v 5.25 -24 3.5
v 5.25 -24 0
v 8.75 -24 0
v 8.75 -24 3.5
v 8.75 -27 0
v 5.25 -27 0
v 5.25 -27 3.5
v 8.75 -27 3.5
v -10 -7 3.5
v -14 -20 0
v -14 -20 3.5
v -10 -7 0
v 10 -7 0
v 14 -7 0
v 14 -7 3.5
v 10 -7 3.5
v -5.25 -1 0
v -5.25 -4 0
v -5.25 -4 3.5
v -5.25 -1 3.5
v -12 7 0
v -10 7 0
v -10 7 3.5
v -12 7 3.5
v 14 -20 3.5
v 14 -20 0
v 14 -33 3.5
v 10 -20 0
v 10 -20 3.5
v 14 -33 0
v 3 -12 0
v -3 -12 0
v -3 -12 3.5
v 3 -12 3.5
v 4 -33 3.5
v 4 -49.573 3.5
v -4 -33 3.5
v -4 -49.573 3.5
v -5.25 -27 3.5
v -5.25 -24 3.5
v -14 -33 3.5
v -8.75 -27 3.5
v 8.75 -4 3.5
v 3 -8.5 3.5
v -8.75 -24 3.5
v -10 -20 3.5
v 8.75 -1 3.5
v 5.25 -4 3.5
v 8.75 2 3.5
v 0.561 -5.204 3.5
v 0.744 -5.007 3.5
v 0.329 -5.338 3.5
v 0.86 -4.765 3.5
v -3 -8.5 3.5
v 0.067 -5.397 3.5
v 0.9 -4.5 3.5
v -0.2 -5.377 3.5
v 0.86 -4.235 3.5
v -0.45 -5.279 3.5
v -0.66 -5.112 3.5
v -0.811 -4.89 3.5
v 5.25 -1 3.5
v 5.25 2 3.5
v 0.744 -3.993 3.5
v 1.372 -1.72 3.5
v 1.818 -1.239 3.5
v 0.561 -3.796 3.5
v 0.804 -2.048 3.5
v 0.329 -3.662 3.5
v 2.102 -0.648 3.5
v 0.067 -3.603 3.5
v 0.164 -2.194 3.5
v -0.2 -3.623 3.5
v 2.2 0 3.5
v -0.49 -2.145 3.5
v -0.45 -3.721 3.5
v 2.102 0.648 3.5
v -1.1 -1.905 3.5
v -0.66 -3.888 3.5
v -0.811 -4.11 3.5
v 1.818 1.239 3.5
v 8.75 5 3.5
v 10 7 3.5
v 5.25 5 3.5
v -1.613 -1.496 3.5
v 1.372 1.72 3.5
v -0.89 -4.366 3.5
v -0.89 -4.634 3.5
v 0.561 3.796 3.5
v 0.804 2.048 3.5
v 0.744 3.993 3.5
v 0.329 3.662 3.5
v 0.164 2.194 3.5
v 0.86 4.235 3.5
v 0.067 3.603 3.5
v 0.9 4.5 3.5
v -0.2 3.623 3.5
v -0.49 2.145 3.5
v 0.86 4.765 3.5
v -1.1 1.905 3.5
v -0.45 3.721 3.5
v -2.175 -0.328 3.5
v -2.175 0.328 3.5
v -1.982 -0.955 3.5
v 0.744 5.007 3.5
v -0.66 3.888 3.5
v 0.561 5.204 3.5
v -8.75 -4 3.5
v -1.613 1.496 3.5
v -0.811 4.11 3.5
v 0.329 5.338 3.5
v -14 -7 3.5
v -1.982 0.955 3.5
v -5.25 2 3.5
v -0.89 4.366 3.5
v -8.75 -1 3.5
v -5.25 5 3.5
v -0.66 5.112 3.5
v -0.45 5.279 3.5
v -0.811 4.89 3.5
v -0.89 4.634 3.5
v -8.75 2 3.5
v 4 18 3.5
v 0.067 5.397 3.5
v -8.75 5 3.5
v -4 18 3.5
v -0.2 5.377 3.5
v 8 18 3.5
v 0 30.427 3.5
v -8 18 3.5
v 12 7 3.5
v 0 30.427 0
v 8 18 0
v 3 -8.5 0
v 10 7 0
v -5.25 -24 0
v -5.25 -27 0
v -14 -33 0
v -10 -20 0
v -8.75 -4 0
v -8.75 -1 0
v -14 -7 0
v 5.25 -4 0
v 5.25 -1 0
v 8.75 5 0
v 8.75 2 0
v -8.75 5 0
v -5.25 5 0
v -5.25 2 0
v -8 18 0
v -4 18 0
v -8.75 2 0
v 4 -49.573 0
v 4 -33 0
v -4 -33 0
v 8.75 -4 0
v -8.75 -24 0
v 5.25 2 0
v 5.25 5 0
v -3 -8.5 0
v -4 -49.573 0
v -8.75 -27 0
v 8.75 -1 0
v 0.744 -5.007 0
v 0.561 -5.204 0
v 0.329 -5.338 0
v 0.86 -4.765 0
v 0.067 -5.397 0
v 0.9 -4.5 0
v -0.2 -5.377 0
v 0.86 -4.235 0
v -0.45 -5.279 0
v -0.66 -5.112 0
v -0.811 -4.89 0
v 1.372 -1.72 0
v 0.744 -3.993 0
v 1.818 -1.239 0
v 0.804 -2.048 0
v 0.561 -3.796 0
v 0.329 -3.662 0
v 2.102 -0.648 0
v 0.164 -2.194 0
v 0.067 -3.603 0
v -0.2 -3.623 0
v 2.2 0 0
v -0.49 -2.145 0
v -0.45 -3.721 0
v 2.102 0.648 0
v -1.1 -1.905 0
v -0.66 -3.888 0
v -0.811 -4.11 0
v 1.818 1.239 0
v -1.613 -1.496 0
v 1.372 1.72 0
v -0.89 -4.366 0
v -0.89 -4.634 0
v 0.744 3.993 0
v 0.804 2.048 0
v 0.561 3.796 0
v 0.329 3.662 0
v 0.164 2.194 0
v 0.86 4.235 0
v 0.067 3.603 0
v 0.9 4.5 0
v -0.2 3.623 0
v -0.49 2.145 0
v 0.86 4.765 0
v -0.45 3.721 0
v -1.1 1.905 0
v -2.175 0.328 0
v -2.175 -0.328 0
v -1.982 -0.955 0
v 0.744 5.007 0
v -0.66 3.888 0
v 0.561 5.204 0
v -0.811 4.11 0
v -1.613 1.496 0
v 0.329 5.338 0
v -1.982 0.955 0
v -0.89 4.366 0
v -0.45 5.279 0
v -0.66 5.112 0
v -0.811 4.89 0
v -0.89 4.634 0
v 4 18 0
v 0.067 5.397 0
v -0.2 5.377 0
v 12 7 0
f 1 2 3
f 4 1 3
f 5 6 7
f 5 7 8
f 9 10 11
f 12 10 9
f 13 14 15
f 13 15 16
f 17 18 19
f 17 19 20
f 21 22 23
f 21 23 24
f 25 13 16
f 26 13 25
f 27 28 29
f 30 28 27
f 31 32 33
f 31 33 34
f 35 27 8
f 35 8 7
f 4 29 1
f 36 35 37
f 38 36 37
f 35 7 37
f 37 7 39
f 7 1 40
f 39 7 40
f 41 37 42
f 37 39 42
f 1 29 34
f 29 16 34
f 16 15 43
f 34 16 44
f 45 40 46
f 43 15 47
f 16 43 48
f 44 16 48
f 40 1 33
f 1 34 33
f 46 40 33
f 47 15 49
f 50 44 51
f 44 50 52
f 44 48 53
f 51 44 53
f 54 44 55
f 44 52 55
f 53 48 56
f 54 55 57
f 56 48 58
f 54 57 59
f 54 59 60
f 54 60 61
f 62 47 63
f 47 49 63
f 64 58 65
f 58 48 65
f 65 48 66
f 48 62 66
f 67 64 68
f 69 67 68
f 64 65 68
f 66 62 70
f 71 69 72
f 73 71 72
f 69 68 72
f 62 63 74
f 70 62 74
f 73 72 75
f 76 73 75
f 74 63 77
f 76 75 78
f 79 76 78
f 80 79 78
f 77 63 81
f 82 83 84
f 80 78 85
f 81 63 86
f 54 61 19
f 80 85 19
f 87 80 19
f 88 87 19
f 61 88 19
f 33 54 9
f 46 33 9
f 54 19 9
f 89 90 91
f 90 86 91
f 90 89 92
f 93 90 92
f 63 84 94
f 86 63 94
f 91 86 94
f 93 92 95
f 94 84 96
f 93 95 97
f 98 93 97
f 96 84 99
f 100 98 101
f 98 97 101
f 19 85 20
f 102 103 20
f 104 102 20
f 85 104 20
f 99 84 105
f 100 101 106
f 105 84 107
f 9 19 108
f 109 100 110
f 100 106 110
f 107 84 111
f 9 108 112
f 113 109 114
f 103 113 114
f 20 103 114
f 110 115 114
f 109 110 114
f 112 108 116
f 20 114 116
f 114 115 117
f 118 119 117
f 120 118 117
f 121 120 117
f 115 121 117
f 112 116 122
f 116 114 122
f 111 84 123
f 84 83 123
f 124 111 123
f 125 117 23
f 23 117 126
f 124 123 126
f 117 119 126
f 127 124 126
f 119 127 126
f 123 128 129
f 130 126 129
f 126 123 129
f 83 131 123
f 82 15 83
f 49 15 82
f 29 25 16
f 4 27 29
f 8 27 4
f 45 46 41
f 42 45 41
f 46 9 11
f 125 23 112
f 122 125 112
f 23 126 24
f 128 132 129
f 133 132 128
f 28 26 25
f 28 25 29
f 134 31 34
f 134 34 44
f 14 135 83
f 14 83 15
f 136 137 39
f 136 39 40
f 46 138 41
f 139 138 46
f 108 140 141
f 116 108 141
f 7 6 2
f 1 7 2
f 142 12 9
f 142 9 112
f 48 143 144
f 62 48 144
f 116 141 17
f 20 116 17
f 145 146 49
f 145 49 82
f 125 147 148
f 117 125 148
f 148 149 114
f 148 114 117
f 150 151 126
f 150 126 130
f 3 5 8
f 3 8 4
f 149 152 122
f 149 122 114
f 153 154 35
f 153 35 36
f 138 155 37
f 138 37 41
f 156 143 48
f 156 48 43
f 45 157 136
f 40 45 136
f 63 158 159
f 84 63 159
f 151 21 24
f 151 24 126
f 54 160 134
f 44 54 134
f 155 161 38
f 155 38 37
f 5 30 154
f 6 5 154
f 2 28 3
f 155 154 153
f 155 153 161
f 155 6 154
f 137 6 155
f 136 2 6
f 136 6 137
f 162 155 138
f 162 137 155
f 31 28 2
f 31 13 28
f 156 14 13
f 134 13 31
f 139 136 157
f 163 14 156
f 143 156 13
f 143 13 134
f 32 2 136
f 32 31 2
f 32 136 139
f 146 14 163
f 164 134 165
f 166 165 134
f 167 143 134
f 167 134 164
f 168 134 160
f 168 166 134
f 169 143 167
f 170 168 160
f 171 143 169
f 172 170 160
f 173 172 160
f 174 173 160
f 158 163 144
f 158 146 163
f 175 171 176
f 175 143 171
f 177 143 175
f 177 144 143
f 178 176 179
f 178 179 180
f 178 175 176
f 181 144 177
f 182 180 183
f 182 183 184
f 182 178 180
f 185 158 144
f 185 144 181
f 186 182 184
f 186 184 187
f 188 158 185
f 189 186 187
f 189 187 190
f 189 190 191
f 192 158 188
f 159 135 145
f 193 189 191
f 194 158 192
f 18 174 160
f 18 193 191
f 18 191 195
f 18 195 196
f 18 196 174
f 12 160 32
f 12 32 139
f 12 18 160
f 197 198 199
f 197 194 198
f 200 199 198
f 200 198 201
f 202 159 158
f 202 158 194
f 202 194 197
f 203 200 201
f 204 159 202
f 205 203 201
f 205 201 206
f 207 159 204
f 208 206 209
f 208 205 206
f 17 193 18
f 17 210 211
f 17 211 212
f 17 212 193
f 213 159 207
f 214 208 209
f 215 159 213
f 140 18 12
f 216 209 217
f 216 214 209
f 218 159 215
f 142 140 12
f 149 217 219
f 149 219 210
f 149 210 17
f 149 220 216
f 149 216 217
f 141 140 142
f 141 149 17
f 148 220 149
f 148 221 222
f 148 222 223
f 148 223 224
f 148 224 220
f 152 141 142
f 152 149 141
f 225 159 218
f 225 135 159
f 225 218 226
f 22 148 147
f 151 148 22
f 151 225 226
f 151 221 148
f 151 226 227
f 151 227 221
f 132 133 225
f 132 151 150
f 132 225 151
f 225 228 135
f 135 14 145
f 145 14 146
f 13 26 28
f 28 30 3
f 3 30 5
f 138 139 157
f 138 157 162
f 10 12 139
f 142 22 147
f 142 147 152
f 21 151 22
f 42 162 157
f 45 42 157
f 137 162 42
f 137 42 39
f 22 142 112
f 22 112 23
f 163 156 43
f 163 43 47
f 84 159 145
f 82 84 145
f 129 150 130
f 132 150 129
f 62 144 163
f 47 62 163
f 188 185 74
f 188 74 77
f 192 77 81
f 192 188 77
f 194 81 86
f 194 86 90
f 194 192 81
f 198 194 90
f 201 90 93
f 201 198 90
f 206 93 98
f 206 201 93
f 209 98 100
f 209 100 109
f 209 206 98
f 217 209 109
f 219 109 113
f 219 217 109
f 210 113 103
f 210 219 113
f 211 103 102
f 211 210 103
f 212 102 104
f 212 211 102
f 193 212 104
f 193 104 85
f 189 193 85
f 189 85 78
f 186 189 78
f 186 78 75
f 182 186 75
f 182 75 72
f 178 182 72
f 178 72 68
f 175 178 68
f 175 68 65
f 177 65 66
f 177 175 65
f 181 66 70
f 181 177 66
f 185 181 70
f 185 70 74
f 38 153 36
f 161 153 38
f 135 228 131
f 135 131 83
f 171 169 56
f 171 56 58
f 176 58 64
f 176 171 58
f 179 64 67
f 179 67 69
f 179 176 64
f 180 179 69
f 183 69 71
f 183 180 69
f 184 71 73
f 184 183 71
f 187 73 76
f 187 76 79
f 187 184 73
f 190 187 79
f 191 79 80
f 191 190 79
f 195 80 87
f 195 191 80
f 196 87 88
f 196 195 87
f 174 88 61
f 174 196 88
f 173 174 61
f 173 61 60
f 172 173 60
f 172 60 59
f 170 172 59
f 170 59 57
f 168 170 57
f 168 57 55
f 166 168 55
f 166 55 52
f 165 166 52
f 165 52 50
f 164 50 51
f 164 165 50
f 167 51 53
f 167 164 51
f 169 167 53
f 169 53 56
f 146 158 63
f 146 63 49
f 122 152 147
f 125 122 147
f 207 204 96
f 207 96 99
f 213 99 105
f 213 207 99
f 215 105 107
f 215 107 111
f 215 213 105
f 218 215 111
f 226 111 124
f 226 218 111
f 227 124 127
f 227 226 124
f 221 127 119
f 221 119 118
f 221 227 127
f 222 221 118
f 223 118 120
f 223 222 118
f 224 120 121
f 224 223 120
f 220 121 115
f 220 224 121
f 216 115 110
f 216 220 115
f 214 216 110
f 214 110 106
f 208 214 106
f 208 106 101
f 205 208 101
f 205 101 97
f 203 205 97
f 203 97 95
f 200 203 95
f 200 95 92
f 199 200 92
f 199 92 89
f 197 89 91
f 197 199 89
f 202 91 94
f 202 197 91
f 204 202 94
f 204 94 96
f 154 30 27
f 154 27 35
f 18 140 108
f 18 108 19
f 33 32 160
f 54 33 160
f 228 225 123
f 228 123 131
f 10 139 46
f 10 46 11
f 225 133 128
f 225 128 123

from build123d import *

# Parameters (mm, degrees)
PROFILE_LASER_PROFILE_3P5_R   = 2.2
PROFILE_LASER_PROFILE_3P5_R_2 = 0.9
PROFILE_LASER_PROFILE_3P5_W   = 3.5
PROFILE_LASER_PROFILE_3P5_H   = 3
PROFILE_LASER_PROFILE_3P5_W_2 = 6
PROFILE_LASER_PROFILE_3P5_H_2 = 3.5
LASER_PROFILE_3P5_DEPTH       = 3.5


with BuildPart() as part:
    # Profile_Laser_profile_3p5 → Laser_profile_3p5 (new body)
    with BuildSketch(Plane.XY):
        Polygon((0, 30.427227289), (8, 18), (4, 18), (12, 7), (10, 7), (14, -7), (10, -7), (14, -20), (10, -20), (14, -33), (4, -33), (4, -49.572772711), (-4, -49.572772711), (-4, -33), (-14, -33), (-10, -20), (-14, -20), (-10, -7), (-14, -7), (-10, 7), (-12, 7), (-4, 18), (-8, 18), align=None)
        Circle(PROFILE_LASER_PROFILE_3P5_R, mode=Mode.SUBTRACT)
        with Locations((0, -4.5)):
            Circle(PROFILE_LASER_PROFILE_3P5_R_2, mode=Mode.SUBTRACT)
        with Locations((0, 4.5)):
            Circle(PROFILE_LASER_PROFILE_3P5_R_2, mode=Mode.SUBTRACT)
        with Locations((-7, 3.5)):
            Rectangle(PROFILE_LASER_PROFILE_3P5_W, PROFILE_LASER_PROFILE_3P5_H, mode=Mode.SUBTRACT)
        with Locations((-7, -2.5)):
            Rectangle(PROFILE_LASER_PROFILE_3P5_W, PROFILE_LASER_PROFILE_3P5_H, mode=Mode.SUBTRACT)
        with Locations((-7, -25.5)):
            Rectangle(PROFILE_LASER_PROFILE_3P5_W, PROFILE_LASER_PROFILE_3P5_H, mode=Mode.SUBTRACT)
        with Locations((7, 3.5)):
            Rectangle(PROFILE_LASER_PROFILE_3P5_W, PROFILE_LASER_PROFILE_3P5_H, mode=Mode.SUBTRACT)
        with Locations((7, -2.5)):
            Rectangle(PROFILE_LASER_PROFILE_3P5_W, PROFILE_LASER_PROFILE_3P5_H, mode=Mode.SUBTRACT)
        with Locations((7, -25.5)):
            Rectangle(PROFILE_LASER_PROFILE_3P5_W, PROFILE_LASER_PROFILE_3P5_H, mode=Mode.SUBTRACT)
        with Locations((0, -10.25)):
            Rectangle(PROFILE_LASER_PROFILE_3P5_W_2, PROFILE_LASER_PROFILE_3P5_H_2, mode=Mode.SUBTRACT)
    extrude(amount=LASER_PROFILE_3P5_DEPTH)


solid = part.part
